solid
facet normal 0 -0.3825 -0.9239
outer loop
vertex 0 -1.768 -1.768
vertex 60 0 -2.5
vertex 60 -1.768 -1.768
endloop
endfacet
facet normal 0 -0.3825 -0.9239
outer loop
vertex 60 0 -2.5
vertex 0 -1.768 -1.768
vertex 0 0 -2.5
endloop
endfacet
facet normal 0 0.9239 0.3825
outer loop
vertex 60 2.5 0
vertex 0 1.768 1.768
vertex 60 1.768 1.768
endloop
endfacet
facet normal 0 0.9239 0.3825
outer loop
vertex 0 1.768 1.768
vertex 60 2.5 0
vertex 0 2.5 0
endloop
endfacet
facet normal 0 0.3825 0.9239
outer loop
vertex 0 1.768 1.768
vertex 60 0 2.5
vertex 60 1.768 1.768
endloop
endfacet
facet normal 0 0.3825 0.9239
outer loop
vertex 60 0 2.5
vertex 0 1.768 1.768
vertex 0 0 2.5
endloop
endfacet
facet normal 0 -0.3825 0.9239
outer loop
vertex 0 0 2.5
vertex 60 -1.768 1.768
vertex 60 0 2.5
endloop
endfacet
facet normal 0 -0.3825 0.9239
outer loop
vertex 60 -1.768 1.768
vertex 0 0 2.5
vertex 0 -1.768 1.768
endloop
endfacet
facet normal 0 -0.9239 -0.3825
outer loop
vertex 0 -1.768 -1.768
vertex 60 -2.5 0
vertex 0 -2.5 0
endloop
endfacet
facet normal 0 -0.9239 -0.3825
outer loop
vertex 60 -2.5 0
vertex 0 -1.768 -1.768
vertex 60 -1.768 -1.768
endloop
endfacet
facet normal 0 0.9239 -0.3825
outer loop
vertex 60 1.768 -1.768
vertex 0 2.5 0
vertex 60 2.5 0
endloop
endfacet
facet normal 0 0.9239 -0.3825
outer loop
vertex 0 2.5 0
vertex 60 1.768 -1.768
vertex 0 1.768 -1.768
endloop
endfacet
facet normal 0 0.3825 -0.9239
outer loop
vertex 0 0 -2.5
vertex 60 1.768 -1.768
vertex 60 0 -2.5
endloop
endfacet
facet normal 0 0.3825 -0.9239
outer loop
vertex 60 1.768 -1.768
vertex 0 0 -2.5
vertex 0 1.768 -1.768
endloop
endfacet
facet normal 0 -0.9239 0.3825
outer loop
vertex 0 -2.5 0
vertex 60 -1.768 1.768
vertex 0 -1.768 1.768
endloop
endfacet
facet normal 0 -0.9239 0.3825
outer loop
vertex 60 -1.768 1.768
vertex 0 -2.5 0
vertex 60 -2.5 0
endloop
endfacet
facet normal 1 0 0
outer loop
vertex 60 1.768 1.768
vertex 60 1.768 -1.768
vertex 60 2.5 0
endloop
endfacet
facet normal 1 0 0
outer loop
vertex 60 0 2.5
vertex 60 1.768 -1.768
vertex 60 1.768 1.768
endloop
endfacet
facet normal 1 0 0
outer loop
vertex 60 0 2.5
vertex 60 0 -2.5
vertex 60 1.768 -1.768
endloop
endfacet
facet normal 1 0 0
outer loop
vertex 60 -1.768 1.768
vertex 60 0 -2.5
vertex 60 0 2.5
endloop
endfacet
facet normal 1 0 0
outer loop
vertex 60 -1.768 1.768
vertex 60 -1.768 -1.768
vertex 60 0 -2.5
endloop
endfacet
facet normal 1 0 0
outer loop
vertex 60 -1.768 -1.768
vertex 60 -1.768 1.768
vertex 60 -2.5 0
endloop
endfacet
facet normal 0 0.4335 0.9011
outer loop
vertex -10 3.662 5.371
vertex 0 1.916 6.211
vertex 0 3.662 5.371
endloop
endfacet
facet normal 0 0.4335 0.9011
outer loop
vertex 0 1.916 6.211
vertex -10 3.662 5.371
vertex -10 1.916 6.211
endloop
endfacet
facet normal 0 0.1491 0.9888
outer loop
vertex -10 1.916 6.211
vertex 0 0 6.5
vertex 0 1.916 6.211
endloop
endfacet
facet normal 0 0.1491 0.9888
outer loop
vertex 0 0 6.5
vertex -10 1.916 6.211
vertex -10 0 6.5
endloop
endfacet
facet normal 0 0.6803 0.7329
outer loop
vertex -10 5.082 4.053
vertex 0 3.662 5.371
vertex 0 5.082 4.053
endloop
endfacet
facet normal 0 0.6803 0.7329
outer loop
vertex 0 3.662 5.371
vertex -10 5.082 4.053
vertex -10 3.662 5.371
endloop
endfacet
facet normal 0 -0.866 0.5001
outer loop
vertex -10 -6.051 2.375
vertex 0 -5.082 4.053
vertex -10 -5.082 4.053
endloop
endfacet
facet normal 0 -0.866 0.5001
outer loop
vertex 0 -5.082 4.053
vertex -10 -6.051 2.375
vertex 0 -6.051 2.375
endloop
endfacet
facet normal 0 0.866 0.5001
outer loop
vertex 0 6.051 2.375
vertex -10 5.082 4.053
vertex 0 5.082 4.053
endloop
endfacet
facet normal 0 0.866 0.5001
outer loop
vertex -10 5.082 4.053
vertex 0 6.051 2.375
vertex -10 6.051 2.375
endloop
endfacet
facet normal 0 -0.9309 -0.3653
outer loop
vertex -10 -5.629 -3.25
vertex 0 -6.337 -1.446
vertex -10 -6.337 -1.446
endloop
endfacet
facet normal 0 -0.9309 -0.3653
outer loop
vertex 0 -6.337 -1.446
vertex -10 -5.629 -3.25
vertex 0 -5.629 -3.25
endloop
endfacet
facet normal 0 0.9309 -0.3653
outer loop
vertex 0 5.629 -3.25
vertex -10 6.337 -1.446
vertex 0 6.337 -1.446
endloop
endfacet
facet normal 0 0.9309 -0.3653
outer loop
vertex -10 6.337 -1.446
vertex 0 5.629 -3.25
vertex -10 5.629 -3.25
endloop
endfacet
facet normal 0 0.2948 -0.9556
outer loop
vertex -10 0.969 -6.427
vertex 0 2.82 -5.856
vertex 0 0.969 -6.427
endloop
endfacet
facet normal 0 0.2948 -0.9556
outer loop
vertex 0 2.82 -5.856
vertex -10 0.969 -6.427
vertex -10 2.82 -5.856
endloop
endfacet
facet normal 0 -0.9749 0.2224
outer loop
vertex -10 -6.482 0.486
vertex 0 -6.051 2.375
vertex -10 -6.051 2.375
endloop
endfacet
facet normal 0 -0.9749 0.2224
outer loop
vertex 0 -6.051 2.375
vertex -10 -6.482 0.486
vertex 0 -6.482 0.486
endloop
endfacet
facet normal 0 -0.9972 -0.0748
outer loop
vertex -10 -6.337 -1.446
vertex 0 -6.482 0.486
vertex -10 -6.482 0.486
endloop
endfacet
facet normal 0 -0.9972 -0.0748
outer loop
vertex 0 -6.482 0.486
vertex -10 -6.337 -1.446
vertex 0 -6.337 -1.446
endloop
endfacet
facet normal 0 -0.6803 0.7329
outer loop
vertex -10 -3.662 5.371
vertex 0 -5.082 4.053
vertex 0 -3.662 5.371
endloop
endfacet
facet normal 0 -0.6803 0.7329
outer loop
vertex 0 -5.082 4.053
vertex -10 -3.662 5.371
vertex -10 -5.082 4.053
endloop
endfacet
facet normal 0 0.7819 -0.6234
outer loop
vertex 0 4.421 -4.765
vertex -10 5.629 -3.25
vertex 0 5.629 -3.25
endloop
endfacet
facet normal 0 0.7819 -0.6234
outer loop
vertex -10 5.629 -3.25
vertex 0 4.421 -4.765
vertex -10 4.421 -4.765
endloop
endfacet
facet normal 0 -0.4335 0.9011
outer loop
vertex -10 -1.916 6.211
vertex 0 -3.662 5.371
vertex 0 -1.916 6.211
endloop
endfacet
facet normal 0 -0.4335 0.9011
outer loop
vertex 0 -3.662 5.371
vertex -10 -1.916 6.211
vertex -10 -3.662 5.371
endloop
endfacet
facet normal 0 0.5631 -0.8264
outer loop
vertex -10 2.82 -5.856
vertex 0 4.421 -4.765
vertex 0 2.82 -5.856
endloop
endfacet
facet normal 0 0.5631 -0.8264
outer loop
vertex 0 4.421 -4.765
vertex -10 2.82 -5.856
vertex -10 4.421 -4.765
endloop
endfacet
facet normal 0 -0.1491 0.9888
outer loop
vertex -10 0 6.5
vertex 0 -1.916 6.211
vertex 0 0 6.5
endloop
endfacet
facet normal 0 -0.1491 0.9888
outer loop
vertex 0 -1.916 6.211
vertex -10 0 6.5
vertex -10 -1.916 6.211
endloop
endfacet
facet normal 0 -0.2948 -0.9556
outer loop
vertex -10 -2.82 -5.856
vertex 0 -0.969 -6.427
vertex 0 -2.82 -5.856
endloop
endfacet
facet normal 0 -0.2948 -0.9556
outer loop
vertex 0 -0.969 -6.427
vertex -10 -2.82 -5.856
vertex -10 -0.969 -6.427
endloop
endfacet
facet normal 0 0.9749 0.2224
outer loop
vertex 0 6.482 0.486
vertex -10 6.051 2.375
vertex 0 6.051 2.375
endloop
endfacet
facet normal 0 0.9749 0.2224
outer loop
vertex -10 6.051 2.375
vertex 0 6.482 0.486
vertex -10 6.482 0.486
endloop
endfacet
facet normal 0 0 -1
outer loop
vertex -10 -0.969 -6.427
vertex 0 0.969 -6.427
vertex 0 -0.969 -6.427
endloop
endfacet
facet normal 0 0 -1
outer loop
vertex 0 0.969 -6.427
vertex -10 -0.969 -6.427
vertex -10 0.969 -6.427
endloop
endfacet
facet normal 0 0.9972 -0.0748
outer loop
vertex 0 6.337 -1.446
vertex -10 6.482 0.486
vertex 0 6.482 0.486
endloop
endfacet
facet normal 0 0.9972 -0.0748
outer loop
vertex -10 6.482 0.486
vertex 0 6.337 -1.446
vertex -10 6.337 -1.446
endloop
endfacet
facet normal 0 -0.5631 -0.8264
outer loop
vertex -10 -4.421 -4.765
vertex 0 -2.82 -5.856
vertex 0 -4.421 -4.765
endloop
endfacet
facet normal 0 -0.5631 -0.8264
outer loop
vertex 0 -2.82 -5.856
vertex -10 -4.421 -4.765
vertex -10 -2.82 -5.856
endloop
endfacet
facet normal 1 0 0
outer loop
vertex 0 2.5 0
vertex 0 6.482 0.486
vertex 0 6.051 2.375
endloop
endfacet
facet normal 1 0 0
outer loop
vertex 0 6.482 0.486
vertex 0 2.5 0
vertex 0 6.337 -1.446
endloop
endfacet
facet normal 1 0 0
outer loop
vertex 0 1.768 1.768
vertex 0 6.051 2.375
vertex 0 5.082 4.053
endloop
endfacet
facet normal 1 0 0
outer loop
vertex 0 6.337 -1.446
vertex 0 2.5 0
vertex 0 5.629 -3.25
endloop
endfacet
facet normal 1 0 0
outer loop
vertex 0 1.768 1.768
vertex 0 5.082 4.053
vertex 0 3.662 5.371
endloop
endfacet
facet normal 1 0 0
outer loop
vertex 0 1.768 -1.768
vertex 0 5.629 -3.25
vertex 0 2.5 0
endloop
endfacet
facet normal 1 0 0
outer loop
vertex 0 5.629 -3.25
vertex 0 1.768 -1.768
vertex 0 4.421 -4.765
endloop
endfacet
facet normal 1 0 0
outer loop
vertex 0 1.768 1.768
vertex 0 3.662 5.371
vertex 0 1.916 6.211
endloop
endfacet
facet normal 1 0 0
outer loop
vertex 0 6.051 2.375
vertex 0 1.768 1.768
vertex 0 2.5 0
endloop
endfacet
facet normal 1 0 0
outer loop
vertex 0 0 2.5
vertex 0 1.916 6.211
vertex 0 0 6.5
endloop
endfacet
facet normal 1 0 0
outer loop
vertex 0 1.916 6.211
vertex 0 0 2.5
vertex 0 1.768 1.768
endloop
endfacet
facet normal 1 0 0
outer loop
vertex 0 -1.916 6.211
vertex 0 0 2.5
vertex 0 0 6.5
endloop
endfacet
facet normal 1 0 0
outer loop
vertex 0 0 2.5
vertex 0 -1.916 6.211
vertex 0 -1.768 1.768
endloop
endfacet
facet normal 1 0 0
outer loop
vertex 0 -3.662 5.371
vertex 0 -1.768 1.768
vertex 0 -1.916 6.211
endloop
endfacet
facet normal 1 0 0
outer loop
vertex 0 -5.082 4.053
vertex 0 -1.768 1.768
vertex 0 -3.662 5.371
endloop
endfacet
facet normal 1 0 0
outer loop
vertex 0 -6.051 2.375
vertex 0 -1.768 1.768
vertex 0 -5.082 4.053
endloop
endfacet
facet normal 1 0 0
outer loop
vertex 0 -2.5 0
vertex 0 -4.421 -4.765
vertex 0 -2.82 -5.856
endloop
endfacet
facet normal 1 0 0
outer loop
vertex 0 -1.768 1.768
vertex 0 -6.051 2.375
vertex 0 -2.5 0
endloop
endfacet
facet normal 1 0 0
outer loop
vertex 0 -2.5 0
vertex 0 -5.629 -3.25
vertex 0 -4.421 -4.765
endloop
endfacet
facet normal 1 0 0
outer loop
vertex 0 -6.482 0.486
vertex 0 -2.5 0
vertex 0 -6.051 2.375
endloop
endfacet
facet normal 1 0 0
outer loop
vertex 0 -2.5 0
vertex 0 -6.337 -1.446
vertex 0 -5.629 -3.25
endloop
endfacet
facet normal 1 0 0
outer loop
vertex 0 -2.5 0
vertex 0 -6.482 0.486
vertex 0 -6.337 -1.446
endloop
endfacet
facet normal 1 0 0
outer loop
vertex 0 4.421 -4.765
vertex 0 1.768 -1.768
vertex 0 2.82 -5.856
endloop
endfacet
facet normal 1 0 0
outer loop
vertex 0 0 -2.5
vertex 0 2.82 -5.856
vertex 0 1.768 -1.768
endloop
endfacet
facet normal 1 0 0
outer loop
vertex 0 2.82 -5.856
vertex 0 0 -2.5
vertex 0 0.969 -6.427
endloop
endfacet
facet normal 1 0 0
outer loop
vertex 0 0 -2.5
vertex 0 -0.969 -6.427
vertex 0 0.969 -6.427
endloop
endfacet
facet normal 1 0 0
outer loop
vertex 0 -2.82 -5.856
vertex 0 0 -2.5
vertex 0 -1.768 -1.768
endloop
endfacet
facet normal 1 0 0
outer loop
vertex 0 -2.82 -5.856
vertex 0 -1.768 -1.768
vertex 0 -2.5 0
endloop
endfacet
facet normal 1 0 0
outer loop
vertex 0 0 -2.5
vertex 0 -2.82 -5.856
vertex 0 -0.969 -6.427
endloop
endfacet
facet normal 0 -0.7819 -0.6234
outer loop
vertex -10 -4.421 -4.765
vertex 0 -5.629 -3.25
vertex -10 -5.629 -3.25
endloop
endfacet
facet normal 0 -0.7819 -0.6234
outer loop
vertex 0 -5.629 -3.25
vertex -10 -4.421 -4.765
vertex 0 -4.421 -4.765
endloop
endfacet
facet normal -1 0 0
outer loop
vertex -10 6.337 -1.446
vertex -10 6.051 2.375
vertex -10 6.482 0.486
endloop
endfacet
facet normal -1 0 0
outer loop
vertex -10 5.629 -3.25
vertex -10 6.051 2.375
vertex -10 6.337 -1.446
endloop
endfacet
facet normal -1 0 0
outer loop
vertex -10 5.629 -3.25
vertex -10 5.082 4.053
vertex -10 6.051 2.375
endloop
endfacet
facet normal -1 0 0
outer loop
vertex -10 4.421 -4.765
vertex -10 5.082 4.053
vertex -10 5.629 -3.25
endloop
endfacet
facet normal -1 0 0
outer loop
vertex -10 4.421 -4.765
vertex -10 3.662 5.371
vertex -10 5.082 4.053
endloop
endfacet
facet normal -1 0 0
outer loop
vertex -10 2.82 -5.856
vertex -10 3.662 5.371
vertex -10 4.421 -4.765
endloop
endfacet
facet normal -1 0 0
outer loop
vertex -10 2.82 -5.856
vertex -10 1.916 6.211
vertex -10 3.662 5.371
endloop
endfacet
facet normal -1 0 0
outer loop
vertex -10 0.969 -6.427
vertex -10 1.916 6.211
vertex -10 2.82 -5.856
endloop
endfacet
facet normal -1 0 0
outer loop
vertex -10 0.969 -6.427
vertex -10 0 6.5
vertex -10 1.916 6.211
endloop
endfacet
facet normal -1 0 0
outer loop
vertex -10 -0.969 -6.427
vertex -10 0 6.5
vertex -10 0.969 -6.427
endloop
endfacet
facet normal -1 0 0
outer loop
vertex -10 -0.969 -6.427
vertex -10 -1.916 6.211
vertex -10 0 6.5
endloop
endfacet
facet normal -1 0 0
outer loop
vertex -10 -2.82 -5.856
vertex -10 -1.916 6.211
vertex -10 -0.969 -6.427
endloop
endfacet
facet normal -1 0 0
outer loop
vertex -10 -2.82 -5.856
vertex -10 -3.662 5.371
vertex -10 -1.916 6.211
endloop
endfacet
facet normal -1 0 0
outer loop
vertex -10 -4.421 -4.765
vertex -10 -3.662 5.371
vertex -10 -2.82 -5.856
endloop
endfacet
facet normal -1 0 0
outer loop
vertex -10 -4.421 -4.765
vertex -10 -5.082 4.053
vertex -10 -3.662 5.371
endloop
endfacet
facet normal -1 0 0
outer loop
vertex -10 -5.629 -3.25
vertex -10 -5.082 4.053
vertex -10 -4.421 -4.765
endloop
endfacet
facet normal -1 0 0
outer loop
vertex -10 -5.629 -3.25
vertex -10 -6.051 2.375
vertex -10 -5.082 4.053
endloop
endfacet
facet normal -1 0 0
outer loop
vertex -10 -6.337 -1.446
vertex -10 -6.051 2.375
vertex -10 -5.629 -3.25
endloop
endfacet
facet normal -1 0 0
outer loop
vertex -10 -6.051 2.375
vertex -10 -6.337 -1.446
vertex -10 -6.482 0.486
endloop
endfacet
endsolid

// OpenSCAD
// file: configuration.scad
// Copyright (C) 2012 t00tie
// Adapto is licensed under the Creative Commons - GNU GPL license.
// http://creativecommons.org/licenses/GPL/2.0/

// Configuration file for Adapto OpenSCAD files

boltOuterRadius=5/2;// outer radius of bolt threads, 5 for M5 bolts
boltLength=60;//bolt length without head (threaded part only)
washerOuterRadius=13/2;// washers that fit the bolts
washerLength=10;// this is large because it is used to make holes for washers

frameX=20;// width of frame parts (alu, wood etc.)
frameY=20;// ditto

boltOffset=frameX/2;// How far in the bolt holes go, may need tweaking if framX!=frameY
// main file
include <configuration.scad>;

module bolt(){
	union(){
		translate([0, 0, -boltLength]) cylinder(r=boltOuterRadius, h=boltLength+1);
		cylinder(r=washerOuterRadius, h=washerLength);
	}
}

// a bolt and washer intended for making equivalent holes
// the parameter from indicates which side the bolt is inserted from
module boltWasher(from="x-"){
	if(from=="x+"){
		rotate([0, 90, 0]) bolt();
	} else
	if(from=="x-"){
		rotate([0, -90, 0]) bolt();
	} else
	if(from=="y+"){
		rotate([-90, 0, 0]) bolt();
	} else
	if(from=="y-"){
		rotate([90, 0, 0]) bolt();
	} else
	if(from=="z+"){
		rotate([0, 0, 0]) bolt();
	} else
	if(from=="z-"){
		rotate([180, 0, 0]) bolt();
	}
}

boltWasher("x-");
